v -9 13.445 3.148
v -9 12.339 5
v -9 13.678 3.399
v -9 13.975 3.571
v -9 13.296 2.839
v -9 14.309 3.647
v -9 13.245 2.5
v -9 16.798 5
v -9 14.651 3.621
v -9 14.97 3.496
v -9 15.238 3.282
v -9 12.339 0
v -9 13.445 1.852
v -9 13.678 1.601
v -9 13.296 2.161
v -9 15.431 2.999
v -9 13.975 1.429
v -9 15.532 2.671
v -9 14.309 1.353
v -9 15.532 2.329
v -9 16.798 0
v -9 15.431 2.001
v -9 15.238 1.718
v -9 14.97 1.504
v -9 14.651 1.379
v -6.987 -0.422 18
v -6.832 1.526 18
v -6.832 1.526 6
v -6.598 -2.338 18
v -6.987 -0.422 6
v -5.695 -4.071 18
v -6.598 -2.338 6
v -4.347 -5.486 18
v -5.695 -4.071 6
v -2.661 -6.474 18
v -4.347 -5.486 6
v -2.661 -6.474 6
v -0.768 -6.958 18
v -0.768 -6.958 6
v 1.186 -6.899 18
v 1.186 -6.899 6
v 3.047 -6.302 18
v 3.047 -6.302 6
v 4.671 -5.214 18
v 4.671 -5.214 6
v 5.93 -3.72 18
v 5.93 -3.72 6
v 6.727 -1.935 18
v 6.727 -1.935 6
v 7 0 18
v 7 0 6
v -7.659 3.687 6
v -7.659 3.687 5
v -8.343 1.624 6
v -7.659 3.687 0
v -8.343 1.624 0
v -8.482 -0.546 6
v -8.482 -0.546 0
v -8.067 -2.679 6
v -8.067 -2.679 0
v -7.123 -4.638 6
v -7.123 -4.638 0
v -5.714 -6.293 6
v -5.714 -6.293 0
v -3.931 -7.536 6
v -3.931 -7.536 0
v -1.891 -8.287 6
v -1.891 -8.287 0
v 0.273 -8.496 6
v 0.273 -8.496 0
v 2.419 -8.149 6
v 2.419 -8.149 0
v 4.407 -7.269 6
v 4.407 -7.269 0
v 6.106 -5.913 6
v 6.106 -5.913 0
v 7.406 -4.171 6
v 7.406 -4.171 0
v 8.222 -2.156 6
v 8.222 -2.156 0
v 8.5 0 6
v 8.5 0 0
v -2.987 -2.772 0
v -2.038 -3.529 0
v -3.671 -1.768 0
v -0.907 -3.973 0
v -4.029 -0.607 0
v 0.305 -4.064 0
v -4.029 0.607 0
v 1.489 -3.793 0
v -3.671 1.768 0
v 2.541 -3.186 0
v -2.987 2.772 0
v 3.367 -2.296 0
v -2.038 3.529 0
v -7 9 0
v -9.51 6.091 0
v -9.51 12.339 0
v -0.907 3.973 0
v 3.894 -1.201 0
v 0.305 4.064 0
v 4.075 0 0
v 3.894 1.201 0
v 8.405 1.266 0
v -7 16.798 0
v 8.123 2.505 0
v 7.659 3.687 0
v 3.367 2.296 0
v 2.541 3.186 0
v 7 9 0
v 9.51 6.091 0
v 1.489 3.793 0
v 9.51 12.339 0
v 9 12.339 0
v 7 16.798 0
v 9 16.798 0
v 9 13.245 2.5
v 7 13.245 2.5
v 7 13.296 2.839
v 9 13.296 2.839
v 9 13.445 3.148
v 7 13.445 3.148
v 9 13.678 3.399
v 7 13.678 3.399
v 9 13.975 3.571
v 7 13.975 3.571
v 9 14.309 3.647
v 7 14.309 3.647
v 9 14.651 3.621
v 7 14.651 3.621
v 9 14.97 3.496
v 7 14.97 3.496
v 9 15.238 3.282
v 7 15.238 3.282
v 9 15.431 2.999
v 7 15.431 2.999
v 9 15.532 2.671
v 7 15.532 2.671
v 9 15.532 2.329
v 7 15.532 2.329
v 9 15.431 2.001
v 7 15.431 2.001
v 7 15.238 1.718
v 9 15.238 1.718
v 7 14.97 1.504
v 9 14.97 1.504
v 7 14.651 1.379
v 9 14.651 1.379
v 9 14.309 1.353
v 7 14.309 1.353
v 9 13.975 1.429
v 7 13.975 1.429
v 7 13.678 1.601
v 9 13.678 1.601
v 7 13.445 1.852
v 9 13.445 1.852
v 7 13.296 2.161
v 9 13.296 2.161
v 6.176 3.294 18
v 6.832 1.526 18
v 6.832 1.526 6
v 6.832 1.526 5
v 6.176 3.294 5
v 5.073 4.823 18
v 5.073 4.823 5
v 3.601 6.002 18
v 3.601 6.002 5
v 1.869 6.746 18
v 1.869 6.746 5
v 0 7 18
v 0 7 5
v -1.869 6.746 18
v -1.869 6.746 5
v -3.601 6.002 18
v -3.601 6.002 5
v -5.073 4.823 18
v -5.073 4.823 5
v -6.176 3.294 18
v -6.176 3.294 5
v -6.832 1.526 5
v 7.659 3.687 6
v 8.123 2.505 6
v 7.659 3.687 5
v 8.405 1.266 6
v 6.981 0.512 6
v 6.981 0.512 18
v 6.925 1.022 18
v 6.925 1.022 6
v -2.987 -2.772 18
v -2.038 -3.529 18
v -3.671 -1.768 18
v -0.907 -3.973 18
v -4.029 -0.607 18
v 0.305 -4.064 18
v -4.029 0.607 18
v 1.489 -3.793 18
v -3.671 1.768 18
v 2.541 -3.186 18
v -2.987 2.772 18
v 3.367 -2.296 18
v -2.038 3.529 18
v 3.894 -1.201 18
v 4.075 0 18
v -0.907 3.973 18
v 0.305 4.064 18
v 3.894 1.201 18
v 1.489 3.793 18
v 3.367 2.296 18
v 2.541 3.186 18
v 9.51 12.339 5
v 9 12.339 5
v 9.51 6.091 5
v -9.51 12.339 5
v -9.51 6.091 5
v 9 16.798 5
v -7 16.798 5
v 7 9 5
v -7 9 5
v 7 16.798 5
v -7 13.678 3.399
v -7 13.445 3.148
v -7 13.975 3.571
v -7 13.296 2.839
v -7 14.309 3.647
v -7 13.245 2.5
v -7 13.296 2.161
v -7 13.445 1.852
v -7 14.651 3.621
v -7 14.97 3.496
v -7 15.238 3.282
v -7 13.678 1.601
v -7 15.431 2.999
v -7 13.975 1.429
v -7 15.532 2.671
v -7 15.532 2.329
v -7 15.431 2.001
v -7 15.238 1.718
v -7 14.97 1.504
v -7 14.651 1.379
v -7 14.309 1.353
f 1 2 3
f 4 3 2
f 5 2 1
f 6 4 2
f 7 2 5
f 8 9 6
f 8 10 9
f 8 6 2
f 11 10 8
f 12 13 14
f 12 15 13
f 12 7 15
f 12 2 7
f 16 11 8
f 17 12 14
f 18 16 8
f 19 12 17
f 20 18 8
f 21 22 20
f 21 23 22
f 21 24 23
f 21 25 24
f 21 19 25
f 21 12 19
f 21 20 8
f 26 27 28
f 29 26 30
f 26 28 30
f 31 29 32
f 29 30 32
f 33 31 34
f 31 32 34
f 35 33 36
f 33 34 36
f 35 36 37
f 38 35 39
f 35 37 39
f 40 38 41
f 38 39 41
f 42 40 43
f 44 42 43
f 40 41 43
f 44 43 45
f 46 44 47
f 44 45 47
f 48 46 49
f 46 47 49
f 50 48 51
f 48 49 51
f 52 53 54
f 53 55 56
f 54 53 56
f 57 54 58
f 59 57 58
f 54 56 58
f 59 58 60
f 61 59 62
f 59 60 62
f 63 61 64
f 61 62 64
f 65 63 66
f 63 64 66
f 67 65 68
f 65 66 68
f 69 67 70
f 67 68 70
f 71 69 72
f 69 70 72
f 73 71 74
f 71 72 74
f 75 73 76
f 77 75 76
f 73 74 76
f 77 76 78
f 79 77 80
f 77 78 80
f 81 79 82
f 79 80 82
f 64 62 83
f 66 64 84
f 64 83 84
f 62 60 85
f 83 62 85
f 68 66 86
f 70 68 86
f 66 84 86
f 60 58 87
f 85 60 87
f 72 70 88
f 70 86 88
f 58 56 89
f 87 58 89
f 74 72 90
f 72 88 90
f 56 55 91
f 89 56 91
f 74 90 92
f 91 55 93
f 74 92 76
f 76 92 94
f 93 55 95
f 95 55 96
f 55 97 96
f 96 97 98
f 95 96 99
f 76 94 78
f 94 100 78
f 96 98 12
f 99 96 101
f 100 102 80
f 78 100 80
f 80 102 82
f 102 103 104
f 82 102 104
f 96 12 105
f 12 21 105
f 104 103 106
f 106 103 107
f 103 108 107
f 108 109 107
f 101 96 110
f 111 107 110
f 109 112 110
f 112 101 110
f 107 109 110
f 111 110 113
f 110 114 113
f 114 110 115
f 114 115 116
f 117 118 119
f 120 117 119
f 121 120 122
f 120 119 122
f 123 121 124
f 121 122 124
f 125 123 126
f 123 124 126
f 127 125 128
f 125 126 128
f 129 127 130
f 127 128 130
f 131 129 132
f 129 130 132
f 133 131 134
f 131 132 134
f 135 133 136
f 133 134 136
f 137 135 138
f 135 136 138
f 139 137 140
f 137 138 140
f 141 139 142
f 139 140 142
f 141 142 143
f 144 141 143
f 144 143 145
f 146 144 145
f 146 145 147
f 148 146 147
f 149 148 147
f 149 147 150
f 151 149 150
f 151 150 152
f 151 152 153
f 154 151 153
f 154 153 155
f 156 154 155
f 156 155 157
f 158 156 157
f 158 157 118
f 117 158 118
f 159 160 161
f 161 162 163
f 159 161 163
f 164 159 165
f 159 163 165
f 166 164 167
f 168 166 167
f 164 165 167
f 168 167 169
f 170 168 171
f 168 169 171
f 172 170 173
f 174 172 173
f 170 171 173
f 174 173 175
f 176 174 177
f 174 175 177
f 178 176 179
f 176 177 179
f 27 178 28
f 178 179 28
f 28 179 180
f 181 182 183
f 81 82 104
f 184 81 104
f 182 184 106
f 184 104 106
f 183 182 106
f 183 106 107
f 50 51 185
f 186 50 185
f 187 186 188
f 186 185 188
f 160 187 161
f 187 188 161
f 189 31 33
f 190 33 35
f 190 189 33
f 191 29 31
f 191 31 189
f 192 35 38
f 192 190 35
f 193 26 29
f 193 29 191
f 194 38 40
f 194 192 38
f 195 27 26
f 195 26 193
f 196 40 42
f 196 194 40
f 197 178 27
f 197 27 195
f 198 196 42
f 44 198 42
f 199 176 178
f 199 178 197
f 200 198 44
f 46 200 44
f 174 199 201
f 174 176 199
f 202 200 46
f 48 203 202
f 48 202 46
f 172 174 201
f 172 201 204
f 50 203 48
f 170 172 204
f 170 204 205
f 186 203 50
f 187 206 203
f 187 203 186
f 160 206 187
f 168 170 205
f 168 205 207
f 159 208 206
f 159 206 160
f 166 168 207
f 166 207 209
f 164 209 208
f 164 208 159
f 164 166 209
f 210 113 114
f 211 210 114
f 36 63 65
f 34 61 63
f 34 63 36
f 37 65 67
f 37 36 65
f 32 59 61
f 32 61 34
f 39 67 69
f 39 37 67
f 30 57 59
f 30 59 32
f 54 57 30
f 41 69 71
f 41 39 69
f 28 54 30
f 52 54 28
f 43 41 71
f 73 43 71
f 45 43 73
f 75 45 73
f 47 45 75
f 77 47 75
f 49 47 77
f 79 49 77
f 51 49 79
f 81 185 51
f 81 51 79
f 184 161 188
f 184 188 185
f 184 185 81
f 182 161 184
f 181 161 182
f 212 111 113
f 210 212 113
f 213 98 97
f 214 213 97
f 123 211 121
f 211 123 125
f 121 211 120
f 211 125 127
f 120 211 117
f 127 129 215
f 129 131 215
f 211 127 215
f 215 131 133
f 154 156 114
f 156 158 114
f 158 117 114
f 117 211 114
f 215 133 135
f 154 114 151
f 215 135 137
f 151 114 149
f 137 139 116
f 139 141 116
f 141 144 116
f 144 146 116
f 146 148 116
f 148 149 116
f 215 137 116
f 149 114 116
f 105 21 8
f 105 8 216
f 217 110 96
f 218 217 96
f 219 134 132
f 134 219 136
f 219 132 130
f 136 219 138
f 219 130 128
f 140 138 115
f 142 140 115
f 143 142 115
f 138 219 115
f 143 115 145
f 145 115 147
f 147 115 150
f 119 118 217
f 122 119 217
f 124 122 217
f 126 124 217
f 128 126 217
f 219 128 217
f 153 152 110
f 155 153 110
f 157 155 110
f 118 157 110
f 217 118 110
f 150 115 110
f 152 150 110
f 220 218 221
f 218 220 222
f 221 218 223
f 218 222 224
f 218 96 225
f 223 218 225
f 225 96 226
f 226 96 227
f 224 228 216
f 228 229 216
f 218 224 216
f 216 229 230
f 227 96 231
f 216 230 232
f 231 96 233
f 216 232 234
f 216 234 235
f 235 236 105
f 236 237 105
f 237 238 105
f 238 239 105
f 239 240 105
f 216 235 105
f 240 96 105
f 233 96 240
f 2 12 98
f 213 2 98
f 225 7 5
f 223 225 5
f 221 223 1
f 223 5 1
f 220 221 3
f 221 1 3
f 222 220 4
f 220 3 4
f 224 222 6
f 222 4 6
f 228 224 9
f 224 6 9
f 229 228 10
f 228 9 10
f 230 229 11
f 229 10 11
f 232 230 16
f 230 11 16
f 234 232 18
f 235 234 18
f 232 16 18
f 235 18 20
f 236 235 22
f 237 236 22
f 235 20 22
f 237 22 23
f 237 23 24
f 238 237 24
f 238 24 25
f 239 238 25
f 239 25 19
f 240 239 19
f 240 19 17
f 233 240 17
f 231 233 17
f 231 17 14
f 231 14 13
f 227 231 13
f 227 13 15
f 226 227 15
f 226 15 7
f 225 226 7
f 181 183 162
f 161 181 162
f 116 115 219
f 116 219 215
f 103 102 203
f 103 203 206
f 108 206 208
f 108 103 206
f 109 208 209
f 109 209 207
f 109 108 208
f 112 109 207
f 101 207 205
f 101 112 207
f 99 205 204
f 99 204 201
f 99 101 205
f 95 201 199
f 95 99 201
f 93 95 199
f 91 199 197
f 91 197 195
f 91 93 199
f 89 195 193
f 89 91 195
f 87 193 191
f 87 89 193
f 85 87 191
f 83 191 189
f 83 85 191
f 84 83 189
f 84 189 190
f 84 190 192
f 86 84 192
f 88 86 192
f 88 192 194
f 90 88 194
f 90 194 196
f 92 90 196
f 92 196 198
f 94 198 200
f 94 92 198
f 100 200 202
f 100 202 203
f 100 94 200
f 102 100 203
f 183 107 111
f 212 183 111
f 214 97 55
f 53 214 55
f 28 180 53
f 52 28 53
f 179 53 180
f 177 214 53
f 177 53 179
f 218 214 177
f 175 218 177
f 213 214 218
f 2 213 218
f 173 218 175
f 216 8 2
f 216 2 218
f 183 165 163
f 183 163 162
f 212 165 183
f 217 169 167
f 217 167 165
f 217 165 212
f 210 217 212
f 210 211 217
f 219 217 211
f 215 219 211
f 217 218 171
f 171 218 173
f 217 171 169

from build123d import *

# Parameters (mm, degrees)
F0_R     = 4.075
F1_DEPTH = 18
F0_W     = 2
F0_H     = 4.459151
F2_DEPTH = 5
F3_DEPTH = 6
F4_R     = 1.15
F5_DEPTH = 25


with BuildPart() as f1:
    # F0 (on Top) → F1 (new body)
    with BuildSketch(Plane.XY):
        with BuildLine():
            ThreePointArc((-6.831683, 1.525812), (-0.767534, -6.957794), (7, 0))
            ThreePointArc((7, 0), (6.957794, 0.767534), (6.831683, 1.525812))
            ThreePointArc((6.831683, 1.525812), (0, 7), (-6.831683, 1.525812))
        make_face()
        Circle(F0_R, mode=Mode.SUBTRACT)
    extrude(amount=F1_DEPTH)

    # F0 (on Top) → F2 (join)
    with BuildSketch(Plane.XY):
        Polygon((-9.510325, 12.338503), (-9.510325, 9), (-7, 9), (-7, 12.338503), (-9, 12.338503), align=None)
        with BuildLine():
            Line((-9.510325, 6.091482), (-7.658741, 3.686961))
            ThreePointArc((-7.658741, 3.686961), (-4.522767, 7.196845), (0, 8.5))
            Line((0, 8.5), (0, 9))
            Line((0, 9), (-7, 9))
            Line((-7, 9), (-9.510325, 9))
            Line((-9.510325, 9), (-9.510325, 6.091482))
        make_face()
        with BuildLine():
            ThreePointArc((-6.831683, 1.525812), (0, 7), (6.831683, 1.525812))
            Line((6.831683, 1.525812), (7.658741, 3.686961))
            ThreePointArc((7.658741, 3.686961), (4.522767, 7.196845), (0, 8.5))
            ThreePointArc((0, 8.5), (-4.522767, 7.196845), (-7.658741, 3.686961))
            Line((-7.658741, 3.686961), (-6.831683, 1.525812))
        make_face()
        with BuildLine():
            ThreePointArc((0, 8.5), (4.522767, 7.196845), (7.658741, 3.686961))
            Line((7.658741, 3.686961), (9.510325, 6.091482))
            Line((9.510325, 6.091482), (9.510325, 9))
            Line((9.510325, 9), (7, 9))
            Line((7, 9), (0, 9))
            Line((0, 9), (0, 8.5))
        make_face()
        Polygon((7, 9), (9.510325, 9), (9.510325, 12.338503), (9, 12.338503), (7, 12.338503), align=None)
        with Locations((-8, 14.568078)):
            Rectangle(F0_W, F0_H)
        with Locations((8, 14.568078)):
            Rectangle(F0_W, F0_H)
    extrude(amount=F2_DEPTH)

    # F0 (on Top) → F3 (join)
    with BuildSketch(Plane.XY):
        with BuildLine():
            ThreePointArc((6.831683, 1.525812), (6.957794, 0.767534), (7, 0))
            ThreePointArc((7, 0), (-0.767534, -6.957794), (-6.831683, 1.525812))
            Line((-6.831683, 1.525812), (-7.658741, 3.686961))
            ThreePointArc((-7.658741, 3.686961), (-1.890859, -8.287017), (8.5, 0))
            ThreePointArc((8.5, 0), (8.287017, 1.890859), (7.658741, 3.686961))
            Line((7.658741, 3.686961), (6.831683, 1.525812))
        make_face()
    extrude(amount=F3_DEPTH)

    # F4 (on face) → F5 (cut)
    with BuildSketch(Plane(origin=(-9, 0, 0), x_dir=(0, -1, 0), z_dir=(-1, 0, 0))):
        with Locations((-14.394956, 2.5)):
            Circle(F4_R)
    extrude(amount=-F5_DEPTH, mode=Mode.SUBTRACT)


solid = f1.part
